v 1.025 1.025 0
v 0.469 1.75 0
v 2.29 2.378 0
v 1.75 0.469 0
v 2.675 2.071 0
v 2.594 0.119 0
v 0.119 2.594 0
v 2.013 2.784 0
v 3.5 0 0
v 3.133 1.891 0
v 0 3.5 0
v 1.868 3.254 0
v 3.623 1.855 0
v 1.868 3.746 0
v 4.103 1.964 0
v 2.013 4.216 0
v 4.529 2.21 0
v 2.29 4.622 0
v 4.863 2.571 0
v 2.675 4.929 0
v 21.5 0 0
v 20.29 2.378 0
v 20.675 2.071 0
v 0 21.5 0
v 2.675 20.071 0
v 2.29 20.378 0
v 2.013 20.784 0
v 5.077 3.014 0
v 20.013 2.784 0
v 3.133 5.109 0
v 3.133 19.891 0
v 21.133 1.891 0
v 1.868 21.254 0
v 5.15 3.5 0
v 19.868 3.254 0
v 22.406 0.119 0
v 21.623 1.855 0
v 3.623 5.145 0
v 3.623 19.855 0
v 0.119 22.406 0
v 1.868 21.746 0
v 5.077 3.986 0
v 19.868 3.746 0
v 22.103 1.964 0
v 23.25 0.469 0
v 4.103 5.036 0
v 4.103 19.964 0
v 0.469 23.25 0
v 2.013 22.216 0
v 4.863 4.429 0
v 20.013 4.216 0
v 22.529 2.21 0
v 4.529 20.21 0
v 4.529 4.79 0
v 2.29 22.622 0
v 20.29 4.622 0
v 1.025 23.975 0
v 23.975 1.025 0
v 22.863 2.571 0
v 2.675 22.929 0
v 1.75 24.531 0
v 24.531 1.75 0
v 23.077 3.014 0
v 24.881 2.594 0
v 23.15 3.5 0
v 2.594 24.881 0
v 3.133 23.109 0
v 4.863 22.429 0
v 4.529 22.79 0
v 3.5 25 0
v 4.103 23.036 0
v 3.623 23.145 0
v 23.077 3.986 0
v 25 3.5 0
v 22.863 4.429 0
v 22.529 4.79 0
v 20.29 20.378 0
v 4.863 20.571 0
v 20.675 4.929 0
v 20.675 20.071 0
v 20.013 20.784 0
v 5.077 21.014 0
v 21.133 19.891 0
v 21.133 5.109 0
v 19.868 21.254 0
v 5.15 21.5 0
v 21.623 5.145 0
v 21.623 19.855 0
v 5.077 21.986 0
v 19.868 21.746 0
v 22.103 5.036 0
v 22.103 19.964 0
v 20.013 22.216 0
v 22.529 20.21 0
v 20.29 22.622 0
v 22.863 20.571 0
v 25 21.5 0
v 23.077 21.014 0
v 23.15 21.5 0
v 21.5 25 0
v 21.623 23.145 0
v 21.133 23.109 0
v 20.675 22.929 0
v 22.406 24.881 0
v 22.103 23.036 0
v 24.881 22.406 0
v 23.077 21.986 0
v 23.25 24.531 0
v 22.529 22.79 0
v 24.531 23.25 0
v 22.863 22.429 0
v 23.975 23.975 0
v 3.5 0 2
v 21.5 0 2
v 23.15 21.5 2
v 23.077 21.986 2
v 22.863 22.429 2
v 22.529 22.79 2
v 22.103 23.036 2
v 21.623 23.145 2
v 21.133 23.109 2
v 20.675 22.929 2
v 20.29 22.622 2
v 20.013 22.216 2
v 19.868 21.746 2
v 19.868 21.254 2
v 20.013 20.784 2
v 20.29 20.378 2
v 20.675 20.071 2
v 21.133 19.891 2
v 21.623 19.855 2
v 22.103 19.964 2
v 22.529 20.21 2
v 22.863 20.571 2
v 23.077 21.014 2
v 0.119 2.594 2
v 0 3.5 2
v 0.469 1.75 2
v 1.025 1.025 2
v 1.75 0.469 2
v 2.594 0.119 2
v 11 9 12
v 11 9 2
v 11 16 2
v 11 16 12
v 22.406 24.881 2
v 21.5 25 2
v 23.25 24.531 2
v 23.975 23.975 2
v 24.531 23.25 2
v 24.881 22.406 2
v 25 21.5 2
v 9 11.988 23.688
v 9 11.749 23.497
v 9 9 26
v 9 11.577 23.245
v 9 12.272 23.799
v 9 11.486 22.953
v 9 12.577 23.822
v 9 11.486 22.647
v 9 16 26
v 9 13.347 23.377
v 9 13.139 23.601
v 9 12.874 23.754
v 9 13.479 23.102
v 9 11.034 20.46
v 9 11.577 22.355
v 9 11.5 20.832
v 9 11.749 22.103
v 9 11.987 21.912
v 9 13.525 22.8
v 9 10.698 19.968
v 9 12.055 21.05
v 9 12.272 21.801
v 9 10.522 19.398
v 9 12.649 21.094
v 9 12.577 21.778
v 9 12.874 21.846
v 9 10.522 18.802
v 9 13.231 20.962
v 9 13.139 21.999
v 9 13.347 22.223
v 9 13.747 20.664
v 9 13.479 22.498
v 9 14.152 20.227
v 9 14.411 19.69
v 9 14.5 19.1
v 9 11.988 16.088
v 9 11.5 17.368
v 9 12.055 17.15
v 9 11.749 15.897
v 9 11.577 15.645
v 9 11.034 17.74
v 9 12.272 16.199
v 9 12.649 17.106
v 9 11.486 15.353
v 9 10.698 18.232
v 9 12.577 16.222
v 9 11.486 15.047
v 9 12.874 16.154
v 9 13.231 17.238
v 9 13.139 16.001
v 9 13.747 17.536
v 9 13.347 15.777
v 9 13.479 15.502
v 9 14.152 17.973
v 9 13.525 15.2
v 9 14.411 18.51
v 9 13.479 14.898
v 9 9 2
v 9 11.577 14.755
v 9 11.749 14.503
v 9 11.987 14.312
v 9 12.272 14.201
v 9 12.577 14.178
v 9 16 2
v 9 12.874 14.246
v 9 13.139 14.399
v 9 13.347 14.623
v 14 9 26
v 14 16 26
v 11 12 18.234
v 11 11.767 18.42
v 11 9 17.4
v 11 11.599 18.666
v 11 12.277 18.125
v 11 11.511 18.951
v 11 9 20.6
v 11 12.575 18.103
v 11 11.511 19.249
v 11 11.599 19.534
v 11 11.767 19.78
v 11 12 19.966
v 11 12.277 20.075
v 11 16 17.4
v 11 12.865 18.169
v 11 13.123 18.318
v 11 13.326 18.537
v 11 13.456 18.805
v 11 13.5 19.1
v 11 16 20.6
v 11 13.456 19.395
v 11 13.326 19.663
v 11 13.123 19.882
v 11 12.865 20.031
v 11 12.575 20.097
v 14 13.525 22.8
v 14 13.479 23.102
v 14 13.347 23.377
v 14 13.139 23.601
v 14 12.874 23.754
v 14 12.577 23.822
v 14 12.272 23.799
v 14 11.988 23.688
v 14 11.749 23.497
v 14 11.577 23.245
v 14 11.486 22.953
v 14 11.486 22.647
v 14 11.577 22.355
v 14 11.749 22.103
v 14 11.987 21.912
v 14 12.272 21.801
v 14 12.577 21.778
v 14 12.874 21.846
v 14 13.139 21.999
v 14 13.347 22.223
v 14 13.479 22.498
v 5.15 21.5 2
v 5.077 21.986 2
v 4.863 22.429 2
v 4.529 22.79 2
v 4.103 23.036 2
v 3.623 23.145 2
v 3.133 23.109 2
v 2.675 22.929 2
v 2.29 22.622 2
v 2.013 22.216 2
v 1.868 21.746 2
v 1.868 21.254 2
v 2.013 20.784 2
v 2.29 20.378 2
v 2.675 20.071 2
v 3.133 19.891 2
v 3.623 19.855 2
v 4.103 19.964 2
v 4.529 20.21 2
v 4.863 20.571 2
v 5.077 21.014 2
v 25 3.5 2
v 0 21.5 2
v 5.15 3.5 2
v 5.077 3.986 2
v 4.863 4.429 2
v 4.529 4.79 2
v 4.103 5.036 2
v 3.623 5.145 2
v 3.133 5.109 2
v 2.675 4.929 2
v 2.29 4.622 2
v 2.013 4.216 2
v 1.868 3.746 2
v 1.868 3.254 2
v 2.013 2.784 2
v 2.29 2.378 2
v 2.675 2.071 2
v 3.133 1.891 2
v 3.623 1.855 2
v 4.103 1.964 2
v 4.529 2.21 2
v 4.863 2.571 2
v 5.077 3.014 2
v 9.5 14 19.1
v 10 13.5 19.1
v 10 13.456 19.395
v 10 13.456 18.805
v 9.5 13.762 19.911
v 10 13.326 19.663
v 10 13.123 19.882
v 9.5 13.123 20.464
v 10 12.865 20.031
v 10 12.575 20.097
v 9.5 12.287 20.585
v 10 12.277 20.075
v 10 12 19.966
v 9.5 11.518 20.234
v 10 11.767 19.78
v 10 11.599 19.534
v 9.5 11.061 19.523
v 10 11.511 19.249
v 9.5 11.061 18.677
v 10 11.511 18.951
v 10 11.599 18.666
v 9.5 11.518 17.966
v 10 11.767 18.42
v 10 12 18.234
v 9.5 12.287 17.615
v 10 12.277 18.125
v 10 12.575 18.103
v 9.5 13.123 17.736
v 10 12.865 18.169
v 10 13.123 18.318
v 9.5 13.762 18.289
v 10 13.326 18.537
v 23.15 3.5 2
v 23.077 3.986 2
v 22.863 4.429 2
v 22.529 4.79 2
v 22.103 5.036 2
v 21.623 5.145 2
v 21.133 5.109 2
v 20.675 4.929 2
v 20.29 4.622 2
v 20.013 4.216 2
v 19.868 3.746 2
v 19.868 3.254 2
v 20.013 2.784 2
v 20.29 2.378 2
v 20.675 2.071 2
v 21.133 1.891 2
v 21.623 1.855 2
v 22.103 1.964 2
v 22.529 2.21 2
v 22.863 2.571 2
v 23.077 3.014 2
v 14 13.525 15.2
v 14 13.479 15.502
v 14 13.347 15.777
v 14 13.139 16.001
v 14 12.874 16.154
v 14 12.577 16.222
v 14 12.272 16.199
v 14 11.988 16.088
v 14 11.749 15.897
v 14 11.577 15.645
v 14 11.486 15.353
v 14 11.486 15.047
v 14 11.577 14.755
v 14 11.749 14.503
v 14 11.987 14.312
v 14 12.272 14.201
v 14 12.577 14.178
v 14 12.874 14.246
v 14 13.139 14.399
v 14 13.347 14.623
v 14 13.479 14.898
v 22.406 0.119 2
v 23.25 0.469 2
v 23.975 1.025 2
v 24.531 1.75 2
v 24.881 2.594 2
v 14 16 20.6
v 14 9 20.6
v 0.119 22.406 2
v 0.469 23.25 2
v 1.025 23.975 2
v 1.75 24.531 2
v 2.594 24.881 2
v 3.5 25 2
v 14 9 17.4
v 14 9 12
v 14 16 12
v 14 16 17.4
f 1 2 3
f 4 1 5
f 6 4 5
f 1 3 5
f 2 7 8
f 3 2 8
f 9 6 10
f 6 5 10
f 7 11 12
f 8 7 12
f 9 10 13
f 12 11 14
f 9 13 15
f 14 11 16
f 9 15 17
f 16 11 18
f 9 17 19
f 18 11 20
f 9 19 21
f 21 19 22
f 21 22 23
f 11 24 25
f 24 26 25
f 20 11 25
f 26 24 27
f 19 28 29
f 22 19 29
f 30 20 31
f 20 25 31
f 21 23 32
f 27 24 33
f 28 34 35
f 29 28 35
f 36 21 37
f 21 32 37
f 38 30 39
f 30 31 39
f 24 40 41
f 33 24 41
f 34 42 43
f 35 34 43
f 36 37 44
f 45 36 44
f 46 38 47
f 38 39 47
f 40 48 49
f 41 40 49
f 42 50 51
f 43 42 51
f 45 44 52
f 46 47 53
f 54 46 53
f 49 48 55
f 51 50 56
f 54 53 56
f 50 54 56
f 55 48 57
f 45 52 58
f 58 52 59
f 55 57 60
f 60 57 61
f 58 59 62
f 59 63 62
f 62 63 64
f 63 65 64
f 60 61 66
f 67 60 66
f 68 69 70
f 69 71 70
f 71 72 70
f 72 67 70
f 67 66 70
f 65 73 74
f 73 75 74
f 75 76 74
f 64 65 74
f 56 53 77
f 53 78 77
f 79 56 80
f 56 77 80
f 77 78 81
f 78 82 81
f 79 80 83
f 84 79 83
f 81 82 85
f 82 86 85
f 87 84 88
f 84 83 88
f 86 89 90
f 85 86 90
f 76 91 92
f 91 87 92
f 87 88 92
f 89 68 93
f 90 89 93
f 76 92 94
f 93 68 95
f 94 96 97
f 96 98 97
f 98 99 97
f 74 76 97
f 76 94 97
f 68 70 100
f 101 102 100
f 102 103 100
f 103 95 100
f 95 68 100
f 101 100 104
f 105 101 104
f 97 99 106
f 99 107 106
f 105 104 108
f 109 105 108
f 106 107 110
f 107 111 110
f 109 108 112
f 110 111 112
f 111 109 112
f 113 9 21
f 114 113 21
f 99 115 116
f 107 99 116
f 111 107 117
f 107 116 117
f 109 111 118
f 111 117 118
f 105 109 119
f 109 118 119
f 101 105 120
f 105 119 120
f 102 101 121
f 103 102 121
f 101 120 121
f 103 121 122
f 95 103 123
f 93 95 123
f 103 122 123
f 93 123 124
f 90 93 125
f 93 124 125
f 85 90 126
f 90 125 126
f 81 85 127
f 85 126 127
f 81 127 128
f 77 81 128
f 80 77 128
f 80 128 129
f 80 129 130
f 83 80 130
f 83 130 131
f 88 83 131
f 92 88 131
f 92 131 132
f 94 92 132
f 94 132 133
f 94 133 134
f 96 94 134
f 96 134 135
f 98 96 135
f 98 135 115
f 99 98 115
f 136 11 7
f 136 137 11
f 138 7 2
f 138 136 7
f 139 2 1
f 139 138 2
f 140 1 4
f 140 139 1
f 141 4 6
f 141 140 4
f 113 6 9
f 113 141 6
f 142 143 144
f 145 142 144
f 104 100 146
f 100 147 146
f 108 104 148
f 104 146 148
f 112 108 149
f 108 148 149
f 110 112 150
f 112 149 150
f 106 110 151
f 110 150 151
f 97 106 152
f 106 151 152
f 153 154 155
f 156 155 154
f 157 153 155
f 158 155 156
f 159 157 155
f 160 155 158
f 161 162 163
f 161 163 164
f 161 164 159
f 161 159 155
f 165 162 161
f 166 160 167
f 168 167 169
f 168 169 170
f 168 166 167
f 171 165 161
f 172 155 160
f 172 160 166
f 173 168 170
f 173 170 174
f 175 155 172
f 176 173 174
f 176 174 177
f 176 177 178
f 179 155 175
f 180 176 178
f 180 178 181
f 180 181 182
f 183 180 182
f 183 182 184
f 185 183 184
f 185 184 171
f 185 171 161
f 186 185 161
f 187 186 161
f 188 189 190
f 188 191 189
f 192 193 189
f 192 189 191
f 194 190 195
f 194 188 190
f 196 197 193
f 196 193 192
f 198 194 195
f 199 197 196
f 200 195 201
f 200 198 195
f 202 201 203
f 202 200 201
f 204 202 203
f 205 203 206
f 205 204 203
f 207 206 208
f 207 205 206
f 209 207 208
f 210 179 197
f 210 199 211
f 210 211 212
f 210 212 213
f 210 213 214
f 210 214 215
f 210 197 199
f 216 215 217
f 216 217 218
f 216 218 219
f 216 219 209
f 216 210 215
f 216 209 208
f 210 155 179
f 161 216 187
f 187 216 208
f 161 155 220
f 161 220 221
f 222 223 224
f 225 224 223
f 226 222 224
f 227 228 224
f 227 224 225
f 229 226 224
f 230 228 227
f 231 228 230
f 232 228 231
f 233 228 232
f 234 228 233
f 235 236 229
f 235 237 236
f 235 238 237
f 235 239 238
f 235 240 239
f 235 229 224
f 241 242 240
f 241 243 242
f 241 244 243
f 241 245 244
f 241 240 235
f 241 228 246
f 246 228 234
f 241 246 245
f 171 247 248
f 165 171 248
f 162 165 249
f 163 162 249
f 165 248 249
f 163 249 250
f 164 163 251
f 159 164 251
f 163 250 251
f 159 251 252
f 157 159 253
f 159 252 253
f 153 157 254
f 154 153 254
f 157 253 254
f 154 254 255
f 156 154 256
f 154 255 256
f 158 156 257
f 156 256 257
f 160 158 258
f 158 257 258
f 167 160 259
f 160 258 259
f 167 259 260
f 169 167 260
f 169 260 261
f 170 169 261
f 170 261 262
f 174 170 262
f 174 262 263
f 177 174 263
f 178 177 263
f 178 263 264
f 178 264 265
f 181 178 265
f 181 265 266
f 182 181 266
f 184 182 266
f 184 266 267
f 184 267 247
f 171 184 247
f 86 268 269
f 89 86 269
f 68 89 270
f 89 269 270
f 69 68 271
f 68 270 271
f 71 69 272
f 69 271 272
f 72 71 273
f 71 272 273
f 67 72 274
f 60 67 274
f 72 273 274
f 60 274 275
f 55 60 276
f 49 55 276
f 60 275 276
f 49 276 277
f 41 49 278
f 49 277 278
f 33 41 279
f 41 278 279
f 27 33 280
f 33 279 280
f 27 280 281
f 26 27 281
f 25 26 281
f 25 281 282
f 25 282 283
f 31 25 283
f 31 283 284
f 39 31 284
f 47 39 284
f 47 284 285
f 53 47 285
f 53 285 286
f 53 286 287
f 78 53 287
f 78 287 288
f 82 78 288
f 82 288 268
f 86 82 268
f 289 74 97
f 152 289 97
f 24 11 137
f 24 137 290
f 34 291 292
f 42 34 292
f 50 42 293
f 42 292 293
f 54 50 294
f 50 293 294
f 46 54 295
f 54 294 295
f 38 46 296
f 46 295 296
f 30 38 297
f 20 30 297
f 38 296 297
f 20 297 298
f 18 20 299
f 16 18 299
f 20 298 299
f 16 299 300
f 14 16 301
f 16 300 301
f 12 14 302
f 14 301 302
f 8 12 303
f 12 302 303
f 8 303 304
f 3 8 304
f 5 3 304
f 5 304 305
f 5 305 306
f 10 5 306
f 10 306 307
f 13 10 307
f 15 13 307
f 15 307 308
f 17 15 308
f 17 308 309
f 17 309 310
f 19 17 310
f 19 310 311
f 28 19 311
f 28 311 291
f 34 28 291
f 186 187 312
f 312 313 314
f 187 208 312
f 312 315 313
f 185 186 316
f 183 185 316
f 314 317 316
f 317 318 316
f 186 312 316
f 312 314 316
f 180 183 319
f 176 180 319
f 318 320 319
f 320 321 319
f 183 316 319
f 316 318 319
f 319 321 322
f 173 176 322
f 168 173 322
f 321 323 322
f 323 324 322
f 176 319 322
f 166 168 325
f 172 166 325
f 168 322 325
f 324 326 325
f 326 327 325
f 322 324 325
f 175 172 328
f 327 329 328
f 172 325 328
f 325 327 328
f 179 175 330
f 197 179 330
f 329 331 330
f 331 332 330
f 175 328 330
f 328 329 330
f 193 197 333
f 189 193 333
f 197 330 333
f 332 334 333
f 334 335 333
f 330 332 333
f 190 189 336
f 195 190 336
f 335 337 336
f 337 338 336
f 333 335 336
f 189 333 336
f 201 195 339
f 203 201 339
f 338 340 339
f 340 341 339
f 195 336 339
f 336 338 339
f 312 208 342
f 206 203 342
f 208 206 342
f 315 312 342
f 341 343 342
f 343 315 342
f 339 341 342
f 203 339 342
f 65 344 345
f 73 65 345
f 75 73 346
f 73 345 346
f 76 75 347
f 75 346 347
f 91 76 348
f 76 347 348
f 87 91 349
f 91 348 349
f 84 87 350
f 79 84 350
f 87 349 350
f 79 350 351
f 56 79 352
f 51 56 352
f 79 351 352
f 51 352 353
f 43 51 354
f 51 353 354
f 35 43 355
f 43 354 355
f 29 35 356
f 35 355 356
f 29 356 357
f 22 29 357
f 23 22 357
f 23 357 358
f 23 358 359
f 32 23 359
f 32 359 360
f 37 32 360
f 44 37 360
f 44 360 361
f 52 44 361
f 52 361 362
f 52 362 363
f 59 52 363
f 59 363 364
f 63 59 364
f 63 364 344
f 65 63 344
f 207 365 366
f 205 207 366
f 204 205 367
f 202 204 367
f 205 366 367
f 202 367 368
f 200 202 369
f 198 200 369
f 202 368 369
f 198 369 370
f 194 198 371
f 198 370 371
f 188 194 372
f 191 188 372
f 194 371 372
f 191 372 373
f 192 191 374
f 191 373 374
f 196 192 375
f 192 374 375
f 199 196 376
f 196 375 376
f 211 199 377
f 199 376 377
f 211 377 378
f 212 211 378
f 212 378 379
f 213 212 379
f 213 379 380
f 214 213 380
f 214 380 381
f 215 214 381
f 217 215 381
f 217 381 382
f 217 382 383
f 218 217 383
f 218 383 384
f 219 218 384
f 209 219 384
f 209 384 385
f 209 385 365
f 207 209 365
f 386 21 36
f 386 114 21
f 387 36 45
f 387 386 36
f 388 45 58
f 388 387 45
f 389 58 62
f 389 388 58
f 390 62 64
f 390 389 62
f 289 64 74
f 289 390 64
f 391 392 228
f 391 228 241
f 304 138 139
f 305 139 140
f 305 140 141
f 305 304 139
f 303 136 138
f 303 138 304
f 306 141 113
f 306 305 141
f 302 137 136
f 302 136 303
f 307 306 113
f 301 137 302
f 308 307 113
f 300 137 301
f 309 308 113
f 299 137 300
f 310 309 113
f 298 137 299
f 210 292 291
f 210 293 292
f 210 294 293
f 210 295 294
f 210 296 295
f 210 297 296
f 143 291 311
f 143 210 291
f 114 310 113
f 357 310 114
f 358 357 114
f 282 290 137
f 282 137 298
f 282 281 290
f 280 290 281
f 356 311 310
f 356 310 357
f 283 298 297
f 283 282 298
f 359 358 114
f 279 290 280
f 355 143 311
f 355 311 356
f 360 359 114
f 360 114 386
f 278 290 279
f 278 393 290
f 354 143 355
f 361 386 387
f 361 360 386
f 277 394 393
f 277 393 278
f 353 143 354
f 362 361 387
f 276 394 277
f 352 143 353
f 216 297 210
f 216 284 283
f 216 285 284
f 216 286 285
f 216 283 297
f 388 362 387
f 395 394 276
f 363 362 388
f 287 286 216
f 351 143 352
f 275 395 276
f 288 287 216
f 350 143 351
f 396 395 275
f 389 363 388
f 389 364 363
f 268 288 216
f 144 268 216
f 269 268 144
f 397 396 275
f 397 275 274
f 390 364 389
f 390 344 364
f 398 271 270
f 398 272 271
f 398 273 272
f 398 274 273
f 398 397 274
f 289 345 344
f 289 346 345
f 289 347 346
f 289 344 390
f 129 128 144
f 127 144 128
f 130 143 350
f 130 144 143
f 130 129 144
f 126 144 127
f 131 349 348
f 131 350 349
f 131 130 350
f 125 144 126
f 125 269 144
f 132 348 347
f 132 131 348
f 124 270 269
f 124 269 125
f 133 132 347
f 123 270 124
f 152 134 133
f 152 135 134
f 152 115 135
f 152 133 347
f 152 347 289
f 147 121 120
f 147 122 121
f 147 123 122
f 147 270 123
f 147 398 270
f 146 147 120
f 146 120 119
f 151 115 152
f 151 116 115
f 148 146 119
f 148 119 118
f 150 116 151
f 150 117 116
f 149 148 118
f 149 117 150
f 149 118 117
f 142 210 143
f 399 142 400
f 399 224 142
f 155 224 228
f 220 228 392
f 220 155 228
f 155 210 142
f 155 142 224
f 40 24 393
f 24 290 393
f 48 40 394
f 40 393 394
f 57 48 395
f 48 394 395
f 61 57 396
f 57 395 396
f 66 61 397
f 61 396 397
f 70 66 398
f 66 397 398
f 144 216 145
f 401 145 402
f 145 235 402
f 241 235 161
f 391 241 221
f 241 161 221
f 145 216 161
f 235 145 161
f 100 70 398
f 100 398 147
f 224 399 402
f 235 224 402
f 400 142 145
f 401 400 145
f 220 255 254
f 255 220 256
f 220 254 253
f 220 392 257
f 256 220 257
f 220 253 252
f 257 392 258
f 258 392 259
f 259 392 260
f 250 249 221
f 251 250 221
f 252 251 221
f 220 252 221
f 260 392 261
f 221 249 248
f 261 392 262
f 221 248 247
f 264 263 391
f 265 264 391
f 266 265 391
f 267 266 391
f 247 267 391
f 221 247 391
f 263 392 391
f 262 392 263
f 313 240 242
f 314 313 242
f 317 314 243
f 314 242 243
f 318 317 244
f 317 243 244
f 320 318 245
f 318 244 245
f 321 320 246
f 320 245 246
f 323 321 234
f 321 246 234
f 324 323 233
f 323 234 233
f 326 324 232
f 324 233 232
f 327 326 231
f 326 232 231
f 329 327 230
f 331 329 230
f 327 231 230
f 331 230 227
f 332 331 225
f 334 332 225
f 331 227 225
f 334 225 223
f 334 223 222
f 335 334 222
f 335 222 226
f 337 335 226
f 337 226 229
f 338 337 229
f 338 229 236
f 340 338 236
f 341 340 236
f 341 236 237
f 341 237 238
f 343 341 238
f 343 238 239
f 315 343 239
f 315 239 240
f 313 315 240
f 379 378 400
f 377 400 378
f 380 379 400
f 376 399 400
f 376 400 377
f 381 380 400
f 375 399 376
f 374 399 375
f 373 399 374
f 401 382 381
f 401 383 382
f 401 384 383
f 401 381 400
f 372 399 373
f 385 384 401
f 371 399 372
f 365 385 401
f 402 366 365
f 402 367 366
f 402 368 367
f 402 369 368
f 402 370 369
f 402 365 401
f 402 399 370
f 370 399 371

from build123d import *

# Parameters (mm, degrees)
F0_W      = 25
F0_H      = 25
F1_DEPTH  = 2
F2_R      = 1.65
F6_DEPTH  = 3
F3_R      = 1.65
F7_DEPTH  = 3
F4_R      = 1.65
F8_DEPTH  = 3
F5_R      = 1.65
F9_DEPTH  = 3
F10_R     = 3.5
F11_W     = 2
F11_H     = 7
F12_DEPTH = 23
F14_W     = 7
F14_H     = 12
F15_DEPTH = 3
F16_W     = 7
F16_H     = 3.2
F17_DEPTH = 3
F19_R     = 1.025
F20_DEPTH = 6
F18_R     = 1.025
F21_DEPTH = 6
F13_R     = 1
F22_DEPTH = 3
F23_SIZE  = 1
F24_DEPTH = 1
F25_DEPTH = 1


with BuildPart() as f1:
    # F0 (on Top) → F1 (new body)
    with BuildSketch(Plane.XY):
        with Locations((12.5, 12.5)):
            Rectangle(F0_W, F0_H)
    extrude(amount=F1_DEPTH)

    # F2 (on face) → F6 (cut)
    with BuildSketch(Plane.XY.offset(2)):
        with Locations((3.5, 21.5)):
            Circle(F2_R)
    extrude(amount=-F6_DEPTH, mode=Mode.SUBTRACT)

    # F3 (on face) → F7 (cut)
    with BuildSketch(Plane.XY.offset(2)):
        with Locations((21.5, 21.5)):
            Circle(F3_R)
    extrude(amount=-F7_DEPTH, mode=Mode.SUBTRACT)

    # F4 (on face) → F8 (cut)
    with BuildSketch(Plane.XY.offset(2)):
        with Locations((3.5, 3.5)):
            Circle(F4_R)
    extrude(amount=-F8_DEPTH, mode=Mode.SUBTRACT)

    # F5 (on face) → F9 (cut)
    with BuildSketch(Plane.XY.offset(2)):
        with Locations((21.5, 3.5)):
            Circle(F5_R)
    extrude(amount=-F9_DEPTH, mode=Mode.SUBTRACT)

    # F10
    f10_edges = [f1.edges().sort_by_distance(p)[0] for p in [
        (0, 0, 1),
        (0, 25, 1),
        (25, 25, 1),
        (25, 0, 1),
    ]]
    fillet(f10_edges, radius=F10_R)

    # F11 (on face) → F12 (join)
    with BuildSketch(Plane.XY.offset(2)):
        with Locations((10, 12.5)):
            Rectangle(F11_W, F11_H)
    extrude(amount=F12_DEPTH)

    # F14 (on face) → F15 (join)
    with BuildSketch(Plane.YZ.offset(11)):
        with Locations((12.5, 19)):
            Rectangle(F14_W, F14_H)
    extrude(amount=F15_DEPTH)

    # F16 (on face) → F17 (cut)
    with BuildSketch(Plane.YZ.offset(14)):
        with Locations((12.5, 19)):
            Rectangle(F16_W, F16_H)
    extrude(amount=-F17_DEPTH, mode=Mode.SUBTRACT)

    # F19 (on face) → F20 (cut)
    with BuildSketch(Plane.YZ.offset(14)):
        with Locations((12.5, 15.2)):
            Circle(F19_R)
    extrude(amount=-F20_DEPTH, mode=Mode.SUBTRACT)

    # F18 (on face) → F21 (cut)
    with BuildSketch(Plane.YZ.offset(14)):
        with Locations((12.5, 22.8)):
            Circle(F18_R)
    extrude(amount=-F21_DEPTH, mode=Mode.SUBTRACT)

    # F13 (on face) → F22 (cut)
    with BuildSketch(Plane.YZ.offset(11)):
        with Locations((12.5, 19.1)):
            Circle(F13_R)
    extrude(amount=-F22_DEPTH, mode=Mode.SUBTRACT)

    # F23
    f23_edges = [f1.edges().sort_by_distance(p)[0] for p in [
        (9, 11.5, 19.1),
    ]]
    chamfer(f23_edges, length=F23_SIZE)

    # F24 (add): a face of the model
    f24_faces = [f1.faces().sort_by_distance(p)[0] for p in [
        (11.5, 12.5, 25),
    ]]
    extrude(f24_faces, amount=F24_DEPTH)

    # F25 (add): a face of the model
    f25_faces = [f1.faces().sort_by_distance(p)[0] for p in [
        (12.5, 12.5, 13),
    ]]
    extrude(f25_faces, amount=F25_DEPTH)


solid = f1.part
